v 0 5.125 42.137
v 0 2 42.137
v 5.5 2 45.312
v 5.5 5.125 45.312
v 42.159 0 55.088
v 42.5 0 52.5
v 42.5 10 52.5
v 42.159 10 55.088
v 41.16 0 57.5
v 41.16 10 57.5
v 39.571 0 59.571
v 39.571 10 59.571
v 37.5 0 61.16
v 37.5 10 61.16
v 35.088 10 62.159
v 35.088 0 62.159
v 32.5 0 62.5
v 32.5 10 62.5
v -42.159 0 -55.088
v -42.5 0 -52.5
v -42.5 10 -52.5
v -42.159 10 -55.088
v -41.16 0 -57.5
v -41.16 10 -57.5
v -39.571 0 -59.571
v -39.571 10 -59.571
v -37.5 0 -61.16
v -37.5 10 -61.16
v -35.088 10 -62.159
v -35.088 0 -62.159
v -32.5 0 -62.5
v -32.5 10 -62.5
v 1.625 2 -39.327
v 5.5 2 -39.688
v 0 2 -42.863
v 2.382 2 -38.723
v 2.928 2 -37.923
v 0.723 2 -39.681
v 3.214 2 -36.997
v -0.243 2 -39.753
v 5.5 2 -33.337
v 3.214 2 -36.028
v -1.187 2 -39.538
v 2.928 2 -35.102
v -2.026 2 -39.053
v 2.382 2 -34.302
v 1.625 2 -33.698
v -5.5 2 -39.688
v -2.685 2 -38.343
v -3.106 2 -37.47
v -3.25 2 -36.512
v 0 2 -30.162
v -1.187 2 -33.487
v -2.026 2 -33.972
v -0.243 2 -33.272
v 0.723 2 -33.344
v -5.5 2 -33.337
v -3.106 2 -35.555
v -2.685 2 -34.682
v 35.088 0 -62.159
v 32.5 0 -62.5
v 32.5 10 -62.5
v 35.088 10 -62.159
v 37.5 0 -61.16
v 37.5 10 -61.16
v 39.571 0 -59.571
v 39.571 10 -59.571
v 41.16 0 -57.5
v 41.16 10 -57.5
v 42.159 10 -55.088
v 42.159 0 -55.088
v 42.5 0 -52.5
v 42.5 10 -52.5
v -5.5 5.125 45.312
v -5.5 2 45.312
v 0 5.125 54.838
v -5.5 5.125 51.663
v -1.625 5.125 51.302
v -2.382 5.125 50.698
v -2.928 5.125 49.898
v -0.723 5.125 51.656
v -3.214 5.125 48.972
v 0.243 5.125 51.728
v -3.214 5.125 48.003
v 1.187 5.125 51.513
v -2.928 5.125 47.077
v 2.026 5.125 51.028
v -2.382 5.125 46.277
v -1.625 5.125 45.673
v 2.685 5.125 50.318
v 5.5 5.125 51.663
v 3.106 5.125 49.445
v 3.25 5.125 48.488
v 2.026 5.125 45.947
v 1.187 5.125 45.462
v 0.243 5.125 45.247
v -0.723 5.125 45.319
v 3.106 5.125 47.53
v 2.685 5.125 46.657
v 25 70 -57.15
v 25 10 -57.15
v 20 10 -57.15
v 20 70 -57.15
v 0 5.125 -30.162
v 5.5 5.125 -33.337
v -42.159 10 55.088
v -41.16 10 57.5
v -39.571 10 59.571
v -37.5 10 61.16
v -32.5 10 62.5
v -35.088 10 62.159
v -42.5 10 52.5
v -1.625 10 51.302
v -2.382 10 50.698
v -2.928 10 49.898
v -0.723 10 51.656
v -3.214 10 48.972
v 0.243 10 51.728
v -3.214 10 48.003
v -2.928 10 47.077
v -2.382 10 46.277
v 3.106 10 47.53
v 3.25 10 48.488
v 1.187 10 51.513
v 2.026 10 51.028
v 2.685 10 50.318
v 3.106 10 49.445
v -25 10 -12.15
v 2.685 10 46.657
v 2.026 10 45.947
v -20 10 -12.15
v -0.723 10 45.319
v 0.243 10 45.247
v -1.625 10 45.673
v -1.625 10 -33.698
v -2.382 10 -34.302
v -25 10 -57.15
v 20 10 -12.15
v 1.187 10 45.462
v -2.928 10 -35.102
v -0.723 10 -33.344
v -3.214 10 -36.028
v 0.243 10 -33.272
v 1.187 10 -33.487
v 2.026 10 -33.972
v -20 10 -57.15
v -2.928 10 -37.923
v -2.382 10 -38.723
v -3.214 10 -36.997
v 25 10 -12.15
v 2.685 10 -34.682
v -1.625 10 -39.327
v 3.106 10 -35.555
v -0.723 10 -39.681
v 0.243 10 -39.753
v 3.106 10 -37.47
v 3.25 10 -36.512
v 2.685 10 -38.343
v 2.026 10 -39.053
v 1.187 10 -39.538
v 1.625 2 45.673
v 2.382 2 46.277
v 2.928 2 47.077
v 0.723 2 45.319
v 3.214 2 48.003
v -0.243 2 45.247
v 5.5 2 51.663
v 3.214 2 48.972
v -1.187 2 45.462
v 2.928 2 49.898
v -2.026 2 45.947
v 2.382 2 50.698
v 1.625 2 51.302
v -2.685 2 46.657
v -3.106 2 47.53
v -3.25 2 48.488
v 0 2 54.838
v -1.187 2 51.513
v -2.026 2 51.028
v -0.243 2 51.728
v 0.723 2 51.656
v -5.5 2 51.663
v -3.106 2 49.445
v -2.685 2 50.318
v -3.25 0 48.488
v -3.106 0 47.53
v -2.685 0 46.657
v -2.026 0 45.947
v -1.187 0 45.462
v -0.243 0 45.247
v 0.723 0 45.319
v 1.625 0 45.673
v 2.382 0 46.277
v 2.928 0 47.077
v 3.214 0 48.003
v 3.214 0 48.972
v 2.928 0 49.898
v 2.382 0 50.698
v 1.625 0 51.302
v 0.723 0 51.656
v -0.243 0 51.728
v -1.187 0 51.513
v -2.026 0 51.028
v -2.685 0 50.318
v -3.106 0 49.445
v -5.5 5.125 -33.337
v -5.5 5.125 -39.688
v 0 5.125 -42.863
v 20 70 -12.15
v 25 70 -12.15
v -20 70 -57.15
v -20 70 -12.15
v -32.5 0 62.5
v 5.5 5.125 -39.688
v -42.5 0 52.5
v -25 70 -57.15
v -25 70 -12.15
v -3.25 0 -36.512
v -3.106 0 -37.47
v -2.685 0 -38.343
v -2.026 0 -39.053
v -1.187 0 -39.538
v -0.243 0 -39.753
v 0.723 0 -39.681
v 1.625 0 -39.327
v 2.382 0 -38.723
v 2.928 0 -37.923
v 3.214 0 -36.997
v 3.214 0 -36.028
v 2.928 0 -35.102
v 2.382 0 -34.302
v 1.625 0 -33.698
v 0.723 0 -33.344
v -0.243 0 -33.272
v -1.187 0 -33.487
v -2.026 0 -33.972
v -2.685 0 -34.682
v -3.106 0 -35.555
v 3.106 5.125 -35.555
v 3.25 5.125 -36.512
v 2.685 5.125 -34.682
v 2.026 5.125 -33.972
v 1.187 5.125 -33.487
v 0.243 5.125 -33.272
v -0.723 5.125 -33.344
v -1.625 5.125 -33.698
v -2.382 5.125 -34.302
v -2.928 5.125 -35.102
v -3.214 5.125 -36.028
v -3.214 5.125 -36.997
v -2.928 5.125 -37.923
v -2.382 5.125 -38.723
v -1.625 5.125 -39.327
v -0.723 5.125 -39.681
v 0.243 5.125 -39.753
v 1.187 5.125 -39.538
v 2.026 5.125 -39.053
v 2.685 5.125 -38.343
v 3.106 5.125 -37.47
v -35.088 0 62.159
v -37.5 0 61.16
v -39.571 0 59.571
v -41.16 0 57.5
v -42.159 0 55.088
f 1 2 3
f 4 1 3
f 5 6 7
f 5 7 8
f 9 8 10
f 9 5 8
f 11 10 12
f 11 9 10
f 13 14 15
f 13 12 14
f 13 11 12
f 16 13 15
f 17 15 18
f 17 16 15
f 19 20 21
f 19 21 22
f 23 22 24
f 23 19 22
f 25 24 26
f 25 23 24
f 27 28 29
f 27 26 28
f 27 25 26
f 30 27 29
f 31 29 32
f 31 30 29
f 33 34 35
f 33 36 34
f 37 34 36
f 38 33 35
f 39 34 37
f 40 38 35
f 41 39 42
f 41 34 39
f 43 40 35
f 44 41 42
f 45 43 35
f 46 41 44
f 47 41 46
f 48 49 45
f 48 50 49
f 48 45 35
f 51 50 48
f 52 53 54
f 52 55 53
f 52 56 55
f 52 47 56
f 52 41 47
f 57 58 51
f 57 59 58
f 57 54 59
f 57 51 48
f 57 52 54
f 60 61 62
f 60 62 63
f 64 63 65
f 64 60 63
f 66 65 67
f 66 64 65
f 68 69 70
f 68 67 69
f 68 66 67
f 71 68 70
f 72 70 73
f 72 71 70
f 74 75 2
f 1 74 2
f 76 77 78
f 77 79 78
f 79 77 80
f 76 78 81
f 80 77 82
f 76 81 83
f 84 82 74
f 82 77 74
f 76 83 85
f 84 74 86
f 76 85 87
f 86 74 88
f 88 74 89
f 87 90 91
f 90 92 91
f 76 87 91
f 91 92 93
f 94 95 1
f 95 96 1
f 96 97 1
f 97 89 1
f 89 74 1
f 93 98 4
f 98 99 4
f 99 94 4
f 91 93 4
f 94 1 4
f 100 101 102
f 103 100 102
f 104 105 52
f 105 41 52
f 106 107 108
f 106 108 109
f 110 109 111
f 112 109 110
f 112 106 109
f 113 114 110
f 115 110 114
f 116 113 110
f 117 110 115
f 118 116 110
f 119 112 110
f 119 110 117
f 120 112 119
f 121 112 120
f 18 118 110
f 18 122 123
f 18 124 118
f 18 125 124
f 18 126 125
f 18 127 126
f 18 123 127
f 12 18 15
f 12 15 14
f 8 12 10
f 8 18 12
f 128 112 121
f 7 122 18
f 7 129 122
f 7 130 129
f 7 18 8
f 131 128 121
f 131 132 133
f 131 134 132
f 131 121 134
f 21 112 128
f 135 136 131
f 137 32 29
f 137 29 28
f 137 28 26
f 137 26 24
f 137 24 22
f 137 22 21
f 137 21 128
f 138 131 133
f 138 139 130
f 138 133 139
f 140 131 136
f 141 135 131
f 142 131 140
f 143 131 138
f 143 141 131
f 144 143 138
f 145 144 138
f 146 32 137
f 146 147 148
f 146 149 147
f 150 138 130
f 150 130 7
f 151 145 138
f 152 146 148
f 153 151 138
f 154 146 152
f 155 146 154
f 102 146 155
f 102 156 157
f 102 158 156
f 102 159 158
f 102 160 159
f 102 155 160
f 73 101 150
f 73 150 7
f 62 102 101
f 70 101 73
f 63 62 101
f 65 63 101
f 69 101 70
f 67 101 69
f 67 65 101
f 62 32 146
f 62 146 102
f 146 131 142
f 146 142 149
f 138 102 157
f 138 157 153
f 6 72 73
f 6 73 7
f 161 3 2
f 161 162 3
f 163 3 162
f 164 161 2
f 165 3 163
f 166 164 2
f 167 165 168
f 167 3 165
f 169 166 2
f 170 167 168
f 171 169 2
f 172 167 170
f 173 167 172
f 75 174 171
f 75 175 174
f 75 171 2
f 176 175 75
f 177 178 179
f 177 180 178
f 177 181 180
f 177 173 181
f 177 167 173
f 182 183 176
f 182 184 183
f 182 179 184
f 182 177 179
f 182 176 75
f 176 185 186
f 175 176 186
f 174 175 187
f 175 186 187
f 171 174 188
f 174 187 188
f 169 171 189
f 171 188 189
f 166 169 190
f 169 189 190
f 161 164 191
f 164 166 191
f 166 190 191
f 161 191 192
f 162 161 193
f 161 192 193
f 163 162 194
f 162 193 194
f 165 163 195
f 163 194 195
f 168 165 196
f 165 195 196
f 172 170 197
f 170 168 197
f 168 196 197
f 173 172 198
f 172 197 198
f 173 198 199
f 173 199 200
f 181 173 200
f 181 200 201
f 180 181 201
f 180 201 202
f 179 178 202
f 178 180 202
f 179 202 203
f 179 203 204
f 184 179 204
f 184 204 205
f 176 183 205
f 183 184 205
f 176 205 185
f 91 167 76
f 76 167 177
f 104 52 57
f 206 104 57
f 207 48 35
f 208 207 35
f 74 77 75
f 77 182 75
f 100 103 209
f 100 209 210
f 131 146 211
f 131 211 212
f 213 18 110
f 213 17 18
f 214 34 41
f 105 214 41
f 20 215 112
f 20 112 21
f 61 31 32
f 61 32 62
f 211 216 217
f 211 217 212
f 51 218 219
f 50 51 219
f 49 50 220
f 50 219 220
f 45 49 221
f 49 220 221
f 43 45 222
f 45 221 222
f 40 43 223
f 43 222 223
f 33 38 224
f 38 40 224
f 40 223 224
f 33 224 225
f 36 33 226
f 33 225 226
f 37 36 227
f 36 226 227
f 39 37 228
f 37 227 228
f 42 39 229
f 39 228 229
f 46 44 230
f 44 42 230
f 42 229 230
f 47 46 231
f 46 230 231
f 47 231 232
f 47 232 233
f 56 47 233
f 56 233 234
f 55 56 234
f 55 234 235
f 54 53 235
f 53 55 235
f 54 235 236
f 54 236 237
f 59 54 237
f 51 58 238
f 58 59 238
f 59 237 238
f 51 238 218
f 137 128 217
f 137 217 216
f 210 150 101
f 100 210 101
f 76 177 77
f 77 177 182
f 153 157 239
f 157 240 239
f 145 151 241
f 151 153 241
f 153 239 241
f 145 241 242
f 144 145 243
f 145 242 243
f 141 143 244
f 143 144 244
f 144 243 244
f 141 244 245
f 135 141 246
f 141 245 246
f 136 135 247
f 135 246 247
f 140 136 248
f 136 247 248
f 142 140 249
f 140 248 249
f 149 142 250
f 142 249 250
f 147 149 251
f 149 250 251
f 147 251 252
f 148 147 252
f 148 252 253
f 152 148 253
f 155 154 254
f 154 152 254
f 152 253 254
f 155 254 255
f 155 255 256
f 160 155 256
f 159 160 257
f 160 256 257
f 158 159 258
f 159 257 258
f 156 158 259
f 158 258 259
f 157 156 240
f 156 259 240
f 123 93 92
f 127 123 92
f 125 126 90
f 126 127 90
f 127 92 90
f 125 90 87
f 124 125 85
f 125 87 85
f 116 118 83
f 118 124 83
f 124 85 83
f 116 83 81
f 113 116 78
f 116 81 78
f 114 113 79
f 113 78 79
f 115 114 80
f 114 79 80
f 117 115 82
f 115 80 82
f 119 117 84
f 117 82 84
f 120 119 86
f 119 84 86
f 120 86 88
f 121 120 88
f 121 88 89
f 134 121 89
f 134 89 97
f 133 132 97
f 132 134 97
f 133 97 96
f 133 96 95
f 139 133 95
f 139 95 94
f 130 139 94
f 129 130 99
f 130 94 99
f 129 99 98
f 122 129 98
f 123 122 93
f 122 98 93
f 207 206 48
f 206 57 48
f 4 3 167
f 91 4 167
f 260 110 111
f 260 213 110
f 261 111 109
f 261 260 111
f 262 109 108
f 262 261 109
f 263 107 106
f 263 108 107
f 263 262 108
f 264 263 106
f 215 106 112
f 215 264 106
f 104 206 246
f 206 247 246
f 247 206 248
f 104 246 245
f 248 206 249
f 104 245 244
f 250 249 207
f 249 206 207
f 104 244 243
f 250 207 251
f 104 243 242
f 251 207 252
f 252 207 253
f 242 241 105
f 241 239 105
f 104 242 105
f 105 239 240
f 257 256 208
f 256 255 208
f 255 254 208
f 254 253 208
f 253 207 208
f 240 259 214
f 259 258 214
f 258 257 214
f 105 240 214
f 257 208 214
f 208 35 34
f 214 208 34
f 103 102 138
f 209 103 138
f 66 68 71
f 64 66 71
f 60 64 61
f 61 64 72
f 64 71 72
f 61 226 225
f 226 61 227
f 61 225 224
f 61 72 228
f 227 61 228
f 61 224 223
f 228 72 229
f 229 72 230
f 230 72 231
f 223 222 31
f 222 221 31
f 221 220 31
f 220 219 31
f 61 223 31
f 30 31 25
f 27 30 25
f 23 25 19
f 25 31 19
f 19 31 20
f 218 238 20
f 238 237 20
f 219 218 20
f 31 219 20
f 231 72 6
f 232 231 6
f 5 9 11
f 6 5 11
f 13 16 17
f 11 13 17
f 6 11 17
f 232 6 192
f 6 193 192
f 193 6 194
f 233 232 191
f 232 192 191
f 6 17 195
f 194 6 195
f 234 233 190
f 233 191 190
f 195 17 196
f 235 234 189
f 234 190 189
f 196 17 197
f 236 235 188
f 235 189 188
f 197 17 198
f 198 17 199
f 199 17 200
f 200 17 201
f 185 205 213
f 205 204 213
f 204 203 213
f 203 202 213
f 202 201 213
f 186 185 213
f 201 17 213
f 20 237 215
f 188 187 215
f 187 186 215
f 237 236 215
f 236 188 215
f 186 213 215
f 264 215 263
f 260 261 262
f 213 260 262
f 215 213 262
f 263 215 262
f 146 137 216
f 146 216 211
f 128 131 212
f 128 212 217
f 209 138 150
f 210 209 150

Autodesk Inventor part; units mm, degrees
ref_plane "YZ Plane" through (0, 0, 0) normal (1, 0, 0) x (0, 1, 0)
ref_plane "XZ Plane" through (0, 0, 0) normal (0, 1, 0) x (-1, 0, 0)
ref_plane "XY Plane" through (0, 0, 0) normal (0, 0, 1) x (1, 0, 0)
sketch "Sketch6" plane through (0, 0, 0) normal (0, 1, 0) x (-1, 0, 0)
  line L0 (32.5, 62.5) -> (-32.5, 62.5)
  line L1 (-42.5, 52.5) -> (-42.5, -52.5)
  line L2 (-32.5, -62.5) -> (32.5, -62.5)
  line L3 (42.5, -52.5) -> (42.5, 52.5)
  line L4 (42.5, 62.5) -> (-42.5, -62.5) construction
  line L5 (-42.5, 62.5) -> (42.5, -62.5) construction
  circle A0 centre (0, -36.5125) radius 3.25
  circle A1 centre (0, 48.4875) radius 3.25
  arc A2 (32.5, -62.5) -> (42.5, -52.5) centre (32.5, -52.5) ccw
  arc A3 (-42.5, -52.5) -> (-32.5, -62.5) centre (-32.5, -52.5) ccw
  arc A4 (-32.5, 62.5) -> (-42.5, 52.5) centre (-32.5, 52.5) ccw
  arc A5 (42.5, 52.5) -> (32.5, 62.5) centre (32.5, 52.5) ccw
  circle A6 centre (0, 48.4875) radius 5.5
  circle A7 centre (0, -36.5125) radius 5.5
  line L6 (-1.445, 54.6718) -> (4.6332, 52.8311)
  line L7 (4.6332, 52.8311) -> (6.0782, 46.6468)
  line L8 (6.0782, 46.6468) -> (1.445, 42.3032)
  line L9 (1.445, 42.3032) -> (-4.6332, 44.1439)
  line L10 (-4.6332, 44.1439) -> (-6.0782, 50.3282)
  line L11 (-6.0782, 50.3282) -> (-1.445, 54.6718)
  line L12 (-1.445, -30.3282) -> (4.6332, -32.1689)
  line L13 (4.6332, -32.1689) -> (6.0782, -38.3532)
  line L14 (6.0782, -38.3532) -> (1.445, -42.6968)
  line L15 (1.445, -42.6968) -> (-4.6332, -40.8561)
  line L16 (-4.6332, -40.8561) -> (-6.0782, -34.6718)
  line L17 (-6.0782, -34.6718) -> (-1.445, -30.3282)
  point P0 (0, 0)
  point P1 (-3.7616, 52.5)
  point P2 (-3.7616, -32.5)
  dimension "d48" = 11
  dimension "d49" = 11
  dimension "d42" = 85
  dimension "d43" = 125
  dimension "d44" = 6.5
  dimension "d45" = 6.5
  dimension "d46" = 85
  dimension "d47" = 10
extrude "Extrusion6" add sketch "Sketch6" along normal blind 2 contours A5 L3 A2 L2 A3 L1 A4 L0 | A6 | A6 L7 L8 | A6 L6 L7 | L8 L9 A6 | A6 L11 L6 | L9 L10 A6 | A6 L10 L11 | A7 | A7 L13 L14 | A7 L12 L13 | L14 L15 A7 | A7 L17 L12 | L15 L16 A7 | A7 L16 L17
sketch "Sketch7" plane through (0, 2, 0) normal (0, 1, 0) x (1, 0, 0)
  circle A0 centre (0, -48.4875) radius 3.25 projected
  circle A1 centre (0, -48.4875) radius 5.5
  circle A2 centre (0, 36.5125) radius 3.25 projected
  circle A3 centre (0, 36.5125) radius 5.5
  line L0 (5.5, -51.6629) -> (0, -54.8384)
  line L1 (0, -54.8384) -> (-5.5, -51.6629)
  line L2 (-5.5, -51.6629) -> (-5.5, -45.3121)
  line L3 (-5.5, -45.3121) -> (0, -42.1366)
  line L4 (0, -42.1366) -> (5.5, -45.3121)
  line L5 (5.5, -45.3121) -> (5.5, -51.6629)
  line L6 (5.5, 33.3371) -> (0, 30.1616)
  line L7 (0, 30.1616) -> (-5.5, 33.3371)
  line L8 (-5.5, 33.3371) -> (-5.5, 39.6879)
  line L9 (-5.5, 39.6879) -> (0, 42.8634)
  line L10 (0, 42.8634) -> (5.5, 39.6879)
  line L11 (5.5, 39.6879) -> (5.5, 33.3371)
  line L12 (-32.5, 62.5) -> (32.5, 62.5)
  line L13 (42.5, 52.5) -> (42.5, -52.5)
  line L14 (32.5, -62.5) -> (-32.5, -62.5)
  line L15 (-42.5, -52.5) -> (-42.5, 52.5)
  line L16 (-42.5, 62.5) -> (42.5, -62.5) construction
  line L17 (42.5, 62.5) -> (-42.5, -62.5) construction
  arc A4 (-42.5, -52.5) -> (-32.5, -62.5) centre (-32.5, -52.5) ccw
  arc A5 (-32.5, 62.5) -> (-42.5, 52.5) centre (-32.5, 52.5) ccw
  arc A6 (42.5, 52.5) -> (32.5, 62.5) centre (32.5, 52.5) ccw
  arc A7 (32.5, -62.5) -> (42.5, -52.5) centre (32.5, -52.5) ccw
  point P0 (0, 0)
  point P1 (5.5, -48.4875)
  point P2 (5.5, 36.5125)
  dimension "d52" = 11
  dimension "d53" = 11
  dimension "d54" = 125
  dimension "d61" = 10
extrude "Extrusion7" add sketch "Sketch7" along normal blind 3.125 contours L12 A6 L13 A7 L14 A4 L15 A5
sketch "Sketch8" plane through (0, 5.125, 0) normal (0, 1, 0) x (1, 0, 0)
  circle A0 centre (0, -48.4875) radius 3.25 projected
  circle A1 centre (0, -48.4875) radius 3.25
  circle A2 centre (0, 36.5125) radius 3.25 projected
  circle A3 centre (0, 36.5125) radius 3.25
  line L0 (-32.5, 62.5) -> (32.5, 62.5)
  line L1 (42.5, 52.5) -> (42.5, -52.5)
  line L2 (32.5, -62.5) -> (-32.5, -62.5)
  line L3 (-42.5, -52.5) -> (-42.5, 52.5)
  line L4 (-42.5, 62.5) -> (42.5, -62.5) construction
  line L5 (42.5, 62.5) -> (-42.5, -62.5) construction
  arc A4 (32.5, -62.5) -> (42.5, -52.5) centre (32.5, -52.5) ccw
  arc A5 (42.5, 52.5) -> (32.5, 62.5) centre (32.5, 52.5) ccw
  arc A6 (-32.5, 62.5) -> (-42.5, 52.5) centre (-32.5, 52.5) ccw
  arc A7 (-42.5, -52.5) -> (-32.5, -62.5) centre (-32.5, -52.5) ccw
  point P0 (0, 0)
  dimension "d62" = 10
extrude "Extrusion8" add sketch "Sketch8" along normal blind 4.875
sketch "Sketch9" plane through (0, 10, 0) normal (0, 1, 0) x (1, 0, 0)
  line L0 (0, -62.5) -> (0, 62.5)
  line L1 (32.5, 62.5) -> (-32.5, 62.5) projected
  line L2 (-25, 57.15) -> (-20, 57.15)
  line L3 (-20, 57.15) -> (-20, 12.15)
  line L4 (-20, 12.15) -> (-25, 12.15)
  line L5 (-25, 12.15) -> (-25, 57.15)
  line L6 (32.5, 62.5) -> (-32.5, 62.5) projected
  line L7 (25, 57.15) -> (20, 57.15)
  line L8 (20, 57.15) -> (20, 12.15)
  line L9 (20, 12.15) -> (25, 12.15)
  line L10 (25, 12.15) -> (25, 57.15)
  point P0 (0, 0)
  dimension "d65" = 5
  dimension "d66" = 45
  dimension "d67" = 20
extrude "Extrusion9" add sketch "Sketch9" along normal blind 60
properties part number "Camera Mount"
